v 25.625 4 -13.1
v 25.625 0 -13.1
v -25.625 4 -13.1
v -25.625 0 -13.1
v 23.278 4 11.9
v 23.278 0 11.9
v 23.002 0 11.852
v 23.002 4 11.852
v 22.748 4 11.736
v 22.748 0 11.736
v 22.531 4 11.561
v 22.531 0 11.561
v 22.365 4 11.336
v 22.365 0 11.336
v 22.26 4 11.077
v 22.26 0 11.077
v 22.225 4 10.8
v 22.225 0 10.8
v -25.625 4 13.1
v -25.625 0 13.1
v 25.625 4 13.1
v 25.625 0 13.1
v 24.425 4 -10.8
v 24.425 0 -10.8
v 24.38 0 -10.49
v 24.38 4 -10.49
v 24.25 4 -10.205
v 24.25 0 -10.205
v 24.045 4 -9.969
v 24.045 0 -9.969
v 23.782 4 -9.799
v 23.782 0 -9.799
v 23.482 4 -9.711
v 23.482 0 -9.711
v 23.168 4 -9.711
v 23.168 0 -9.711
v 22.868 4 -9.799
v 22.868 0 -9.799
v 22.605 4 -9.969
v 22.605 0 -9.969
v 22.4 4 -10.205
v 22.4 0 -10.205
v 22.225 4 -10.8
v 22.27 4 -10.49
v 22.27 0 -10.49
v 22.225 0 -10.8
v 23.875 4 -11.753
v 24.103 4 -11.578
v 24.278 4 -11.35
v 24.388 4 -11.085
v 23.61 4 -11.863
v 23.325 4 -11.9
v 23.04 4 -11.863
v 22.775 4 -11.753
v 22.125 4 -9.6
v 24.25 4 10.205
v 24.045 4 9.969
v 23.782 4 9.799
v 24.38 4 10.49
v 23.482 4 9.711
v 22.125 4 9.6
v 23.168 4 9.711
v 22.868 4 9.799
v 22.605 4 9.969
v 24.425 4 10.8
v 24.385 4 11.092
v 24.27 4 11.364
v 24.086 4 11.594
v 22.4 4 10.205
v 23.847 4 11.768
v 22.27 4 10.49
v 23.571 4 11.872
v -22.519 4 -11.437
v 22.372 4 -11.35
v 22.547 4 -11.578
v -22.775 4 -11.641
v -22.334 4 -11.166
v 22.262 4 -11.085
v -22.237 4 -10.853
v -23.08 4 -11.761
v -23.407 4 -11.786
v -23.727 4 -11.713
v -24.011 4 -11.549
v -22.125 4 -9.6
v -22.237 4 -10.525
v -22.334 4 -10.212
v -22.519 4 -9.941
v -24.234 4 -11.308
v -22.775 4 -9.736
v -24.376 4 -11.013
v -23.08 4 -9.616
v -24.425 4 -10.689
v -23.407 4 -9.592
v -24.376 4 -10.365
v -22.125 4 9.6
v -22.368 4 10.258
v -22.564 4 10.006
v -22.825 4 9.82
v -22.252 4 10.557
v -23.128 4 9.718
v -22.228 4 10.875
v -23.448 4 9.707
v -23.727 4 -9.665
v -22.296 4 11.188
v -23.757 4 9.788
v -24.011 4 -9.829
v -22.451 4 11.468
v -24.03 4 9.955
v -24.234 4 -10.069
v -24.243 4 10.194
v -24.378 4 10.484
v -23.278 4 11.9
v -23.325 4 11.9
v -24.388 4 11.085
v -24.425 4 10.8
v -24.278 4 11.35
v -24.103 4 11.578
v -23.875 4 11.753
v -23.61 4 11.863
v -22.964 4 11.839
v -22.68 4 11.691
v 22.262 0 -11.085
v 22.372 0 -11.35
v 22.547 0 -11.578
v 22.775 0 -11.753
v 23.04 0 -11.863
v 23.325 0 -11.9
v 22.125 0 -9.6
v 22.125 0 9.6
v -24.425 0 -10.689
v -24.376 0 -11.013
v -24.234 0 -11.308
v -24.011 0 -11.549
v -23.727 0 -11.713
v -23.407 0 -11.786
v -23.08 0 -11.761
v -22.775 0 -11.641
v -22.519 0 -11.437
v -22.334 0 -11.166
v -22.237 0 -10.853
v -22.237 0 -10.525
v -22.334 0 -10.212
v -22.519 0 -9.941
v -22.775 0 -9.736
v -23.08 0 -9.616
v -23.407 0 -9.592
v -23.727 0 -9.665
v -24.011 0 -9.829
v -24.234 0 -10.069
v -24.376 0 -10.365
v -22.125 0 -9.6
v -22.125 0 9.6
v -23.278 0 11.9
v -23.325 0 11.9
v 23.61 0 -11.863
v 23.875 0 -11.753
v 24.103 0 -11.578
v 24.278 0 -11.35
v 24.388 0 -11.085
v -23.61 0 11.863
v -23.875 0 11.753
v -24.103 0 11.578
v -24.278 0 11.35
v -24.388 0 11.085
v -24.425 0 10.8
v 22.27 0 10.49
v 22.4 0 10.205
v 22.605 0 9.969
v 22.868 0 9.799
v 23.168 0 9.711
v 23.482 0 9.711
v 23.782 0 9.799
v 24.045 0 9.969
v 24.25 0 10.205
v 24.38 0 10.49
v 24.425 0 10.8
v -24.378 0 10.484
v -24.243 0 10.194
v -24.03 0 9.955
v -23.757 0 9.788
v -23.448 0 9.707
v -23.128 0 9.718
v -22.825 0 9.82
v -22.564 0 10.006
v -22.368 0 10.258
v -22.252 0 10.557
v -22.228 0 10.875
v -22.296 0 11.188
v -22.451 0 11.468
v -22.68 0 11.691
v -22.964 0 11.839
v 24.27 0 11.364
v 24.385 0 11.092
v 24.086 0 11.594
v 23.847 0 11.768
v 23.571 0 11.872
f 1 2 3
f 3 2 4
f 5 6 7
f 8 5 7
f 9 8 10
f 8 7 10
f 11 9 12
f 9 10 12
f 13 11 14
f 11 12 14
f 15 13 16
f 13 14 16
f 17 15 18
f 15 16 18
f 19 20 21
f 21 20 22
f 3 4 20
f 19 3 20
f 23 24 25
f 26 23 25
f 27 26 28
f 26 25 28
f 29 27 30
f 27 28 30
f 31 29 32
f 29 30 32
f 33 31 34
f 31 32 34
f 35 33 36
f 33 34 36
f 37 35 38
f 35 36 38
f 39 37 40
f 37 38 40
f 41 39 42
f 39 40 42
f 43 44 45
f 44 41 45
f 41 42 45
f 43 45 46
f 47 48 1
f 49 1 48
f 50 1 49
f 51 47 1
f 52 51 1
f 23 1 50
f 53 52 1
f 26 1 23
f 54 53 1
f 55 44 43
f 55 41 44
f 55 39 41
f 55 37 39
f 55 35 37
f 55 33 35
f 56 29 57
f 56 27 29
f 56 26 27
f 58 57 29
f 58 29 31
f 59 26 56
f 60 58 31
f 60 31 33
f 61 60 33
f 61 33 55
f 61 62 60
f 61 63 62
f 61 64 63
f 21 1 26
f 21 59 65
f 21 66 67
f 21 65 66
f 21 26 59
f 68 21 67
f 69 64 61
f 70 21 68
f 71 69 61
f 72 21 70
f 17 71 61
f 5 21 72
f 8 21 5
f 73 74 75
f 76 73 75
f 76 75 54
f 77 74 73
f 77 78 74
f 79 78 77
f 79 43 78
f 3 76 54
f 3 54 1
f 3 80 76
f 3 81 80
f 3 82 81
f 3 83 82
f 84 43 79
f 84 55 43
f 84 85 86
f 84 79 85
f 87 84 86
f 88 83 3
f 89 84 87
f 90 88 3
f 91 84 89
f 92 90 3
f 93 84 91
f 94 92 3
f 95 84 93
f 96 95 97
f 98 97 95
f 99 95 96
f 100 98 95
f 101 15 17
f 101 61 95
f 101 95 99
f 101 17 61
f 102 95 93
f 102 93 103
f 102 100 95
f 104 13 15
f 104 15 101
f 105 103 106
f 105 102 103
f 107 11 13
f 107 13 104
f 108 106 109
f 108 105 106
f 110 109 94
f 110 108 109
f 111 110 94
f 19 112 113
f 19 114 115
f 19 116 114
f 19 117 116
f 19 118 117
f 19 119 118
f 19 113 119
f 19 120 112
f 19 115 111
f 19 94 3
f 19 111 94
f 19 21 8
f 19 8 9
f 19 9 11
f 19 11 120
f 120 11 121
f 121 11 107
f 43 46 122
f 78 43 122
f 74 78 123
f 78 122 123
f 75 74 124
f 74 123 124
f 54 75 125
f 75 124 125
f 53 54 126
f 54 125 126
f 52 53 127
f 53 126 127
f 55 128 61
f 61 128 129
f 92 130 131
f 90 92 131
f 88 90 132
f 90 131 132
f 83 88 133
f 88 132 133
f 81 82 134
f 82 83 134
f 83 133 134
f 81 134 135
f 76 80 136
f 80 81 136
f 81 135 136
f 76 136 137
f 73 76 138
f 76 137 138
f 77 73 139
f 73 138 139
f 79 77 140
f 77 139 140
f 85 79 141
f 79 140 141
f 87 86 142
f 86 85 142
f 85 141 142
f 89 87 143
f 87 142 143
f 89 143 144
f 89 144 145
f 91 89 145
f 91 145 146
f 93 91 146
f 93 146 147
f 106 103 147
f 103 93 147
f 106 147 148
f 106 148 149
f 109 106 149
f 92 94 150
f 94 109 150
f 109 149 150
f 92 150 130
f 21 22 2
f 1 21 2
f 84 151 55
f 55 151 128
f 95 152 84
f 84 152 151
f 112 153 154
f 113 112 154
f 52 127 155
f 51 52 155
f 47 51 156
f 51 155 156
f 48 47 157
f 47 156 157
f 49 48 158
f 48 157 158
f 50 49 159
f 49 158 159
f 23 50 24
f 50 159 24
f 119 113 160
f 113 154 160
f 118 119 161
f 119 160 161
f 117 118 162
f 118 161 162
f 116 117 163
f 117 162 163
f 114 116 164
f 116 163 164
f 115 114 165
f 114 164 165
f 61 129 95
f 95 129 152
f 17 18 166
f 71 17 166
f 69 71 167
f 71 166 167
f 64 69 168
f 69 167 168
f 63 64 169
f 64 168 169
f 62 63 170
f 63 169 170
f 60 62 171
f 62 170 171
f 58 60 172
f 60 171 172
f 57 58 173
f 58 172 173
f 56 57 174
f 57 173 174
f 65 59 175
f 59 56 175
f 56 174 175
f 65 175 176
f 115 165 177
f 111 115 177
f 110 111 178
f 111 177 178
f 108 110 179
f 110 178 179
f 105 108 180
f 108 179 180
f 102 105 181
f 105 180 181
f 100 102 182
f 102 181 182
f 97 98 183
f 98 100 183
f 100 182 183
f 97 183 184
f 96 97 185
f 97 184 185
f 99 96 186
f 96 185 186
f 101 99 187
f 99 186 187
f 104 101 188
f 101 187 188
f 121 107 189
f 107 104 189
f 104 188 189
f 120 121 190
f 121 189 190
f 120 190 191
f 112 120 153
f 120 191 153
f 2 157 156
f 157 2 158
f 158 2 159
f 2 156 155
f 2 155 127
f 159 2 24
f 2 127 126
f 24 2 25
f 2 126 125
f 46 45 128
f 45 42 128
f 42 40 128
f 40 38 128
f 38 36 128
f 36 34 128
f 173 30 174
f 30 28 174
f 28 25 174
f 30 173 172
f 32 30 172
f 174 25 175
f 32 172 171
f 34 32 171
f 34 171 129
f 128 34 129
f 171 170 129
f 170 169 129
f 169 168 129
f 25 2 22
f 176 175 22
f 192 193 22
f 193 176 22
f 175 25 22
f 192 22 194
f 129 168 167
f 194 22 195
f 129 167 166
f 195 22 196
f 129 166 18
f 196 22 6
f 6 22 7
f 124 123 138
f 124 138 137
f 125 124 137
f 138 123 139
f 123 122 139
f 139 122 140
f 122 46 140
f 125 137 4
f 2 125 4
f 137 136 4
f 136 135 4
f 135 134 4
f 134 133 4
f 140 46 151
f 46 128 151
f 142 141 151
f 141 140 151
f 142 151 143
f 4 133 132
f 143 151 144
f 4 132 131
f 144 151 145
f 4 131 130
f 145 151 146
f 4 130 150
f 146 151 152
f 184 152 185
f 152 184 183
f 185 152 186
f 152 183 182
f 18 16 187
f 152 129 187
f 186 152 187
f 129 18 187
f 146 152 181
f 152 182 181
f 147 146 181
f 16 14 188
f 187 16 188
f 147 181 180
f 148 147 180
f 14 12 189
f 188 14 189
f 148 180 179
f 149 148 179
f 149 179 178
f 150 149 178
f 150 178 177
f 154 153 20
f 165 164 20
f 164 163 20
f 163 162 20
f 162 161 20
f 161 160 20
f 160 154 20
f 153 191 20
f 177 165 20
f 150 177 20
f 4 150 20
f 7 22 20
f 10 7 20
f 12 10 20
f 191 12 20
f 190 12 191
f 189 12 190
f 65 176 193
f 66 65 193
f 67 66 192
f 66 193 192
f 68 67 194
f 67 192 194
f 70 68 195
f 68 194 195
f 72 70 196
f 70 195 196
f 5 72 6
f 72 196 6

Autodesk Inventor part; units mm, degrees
ref_plane "YZ Plane" through (0, 0, 0) normal (1, 0, 0) x (0, 1, 0)
ref_plane "XZ Plane" through (0, 0, 0) normal (0, 1, 0) x (-1, 0, 0)
ref_plane "XY Plane" through (0, 0, 0) normal (0, 0, 1) x (1, 0, 0)
sketch "Boceto1" plane through (0, 0, 0) normal (0, 1, 0) x (-1, 0, 0)
  line L0 (-25.625, -13.1) -> (25.625, -13.1)
  line L1 (25.625, -13.1) -> (25.625, 13.1)
  line L2 (25.625, 13.1) -> (-25.625, 13.1)
  line L3 (-25.625, 13.1) -> (-25.625, -13.1)
  line L4 (-25.625, -13.1) -> (25.625, 13.1) construction
  line L5 (25.625, -13.1) -> (-25.625, 13.1) construction
  line L6 (24.425, -11.9) -> (-24.425, -11.9)
  line L7 (-24.425, -10.8) -> (-24.425, 10.8)
  circle A0 centre (23.325, 10.8) radius 1.1
  circle A1 centre (-23.325, 10.8) radius 1.1
  circle A2 centre (-23.325, -10.8) radius 1.1
  circle A3 centre (23.325, -10.6888) radius 1.1
  line L8 (-24.425, 11.9) -> (-23.2777, 11.9)
  line L9 (23.2777, 11.9) -> (23.325, 11.9)
  line L10 (-22.125, 9.6) -> (22.125, 9.6)
  line L11 (22.125, 9.6) -> (22.125, -9.6)
  line L12 (22.125, -9.6) -> (-22.125, -9.6)
  line L13 (-22.125, -9.6) -> (-22.125, 9.6)
  point P0 (0, 0)
  dimension "d3" = 2.2
  dimension "d4" = 2.2
  dimension "d5" = 2.2
  dimension "d0" = 51.25
  dimension "d1" = 26.2
  dimension "d6" = 2.2
  dimension "d7" = 3.5
extrude "Extrusión1" add sketch "Boceto1" along normal blind 4
properties part number "Buck 2"
